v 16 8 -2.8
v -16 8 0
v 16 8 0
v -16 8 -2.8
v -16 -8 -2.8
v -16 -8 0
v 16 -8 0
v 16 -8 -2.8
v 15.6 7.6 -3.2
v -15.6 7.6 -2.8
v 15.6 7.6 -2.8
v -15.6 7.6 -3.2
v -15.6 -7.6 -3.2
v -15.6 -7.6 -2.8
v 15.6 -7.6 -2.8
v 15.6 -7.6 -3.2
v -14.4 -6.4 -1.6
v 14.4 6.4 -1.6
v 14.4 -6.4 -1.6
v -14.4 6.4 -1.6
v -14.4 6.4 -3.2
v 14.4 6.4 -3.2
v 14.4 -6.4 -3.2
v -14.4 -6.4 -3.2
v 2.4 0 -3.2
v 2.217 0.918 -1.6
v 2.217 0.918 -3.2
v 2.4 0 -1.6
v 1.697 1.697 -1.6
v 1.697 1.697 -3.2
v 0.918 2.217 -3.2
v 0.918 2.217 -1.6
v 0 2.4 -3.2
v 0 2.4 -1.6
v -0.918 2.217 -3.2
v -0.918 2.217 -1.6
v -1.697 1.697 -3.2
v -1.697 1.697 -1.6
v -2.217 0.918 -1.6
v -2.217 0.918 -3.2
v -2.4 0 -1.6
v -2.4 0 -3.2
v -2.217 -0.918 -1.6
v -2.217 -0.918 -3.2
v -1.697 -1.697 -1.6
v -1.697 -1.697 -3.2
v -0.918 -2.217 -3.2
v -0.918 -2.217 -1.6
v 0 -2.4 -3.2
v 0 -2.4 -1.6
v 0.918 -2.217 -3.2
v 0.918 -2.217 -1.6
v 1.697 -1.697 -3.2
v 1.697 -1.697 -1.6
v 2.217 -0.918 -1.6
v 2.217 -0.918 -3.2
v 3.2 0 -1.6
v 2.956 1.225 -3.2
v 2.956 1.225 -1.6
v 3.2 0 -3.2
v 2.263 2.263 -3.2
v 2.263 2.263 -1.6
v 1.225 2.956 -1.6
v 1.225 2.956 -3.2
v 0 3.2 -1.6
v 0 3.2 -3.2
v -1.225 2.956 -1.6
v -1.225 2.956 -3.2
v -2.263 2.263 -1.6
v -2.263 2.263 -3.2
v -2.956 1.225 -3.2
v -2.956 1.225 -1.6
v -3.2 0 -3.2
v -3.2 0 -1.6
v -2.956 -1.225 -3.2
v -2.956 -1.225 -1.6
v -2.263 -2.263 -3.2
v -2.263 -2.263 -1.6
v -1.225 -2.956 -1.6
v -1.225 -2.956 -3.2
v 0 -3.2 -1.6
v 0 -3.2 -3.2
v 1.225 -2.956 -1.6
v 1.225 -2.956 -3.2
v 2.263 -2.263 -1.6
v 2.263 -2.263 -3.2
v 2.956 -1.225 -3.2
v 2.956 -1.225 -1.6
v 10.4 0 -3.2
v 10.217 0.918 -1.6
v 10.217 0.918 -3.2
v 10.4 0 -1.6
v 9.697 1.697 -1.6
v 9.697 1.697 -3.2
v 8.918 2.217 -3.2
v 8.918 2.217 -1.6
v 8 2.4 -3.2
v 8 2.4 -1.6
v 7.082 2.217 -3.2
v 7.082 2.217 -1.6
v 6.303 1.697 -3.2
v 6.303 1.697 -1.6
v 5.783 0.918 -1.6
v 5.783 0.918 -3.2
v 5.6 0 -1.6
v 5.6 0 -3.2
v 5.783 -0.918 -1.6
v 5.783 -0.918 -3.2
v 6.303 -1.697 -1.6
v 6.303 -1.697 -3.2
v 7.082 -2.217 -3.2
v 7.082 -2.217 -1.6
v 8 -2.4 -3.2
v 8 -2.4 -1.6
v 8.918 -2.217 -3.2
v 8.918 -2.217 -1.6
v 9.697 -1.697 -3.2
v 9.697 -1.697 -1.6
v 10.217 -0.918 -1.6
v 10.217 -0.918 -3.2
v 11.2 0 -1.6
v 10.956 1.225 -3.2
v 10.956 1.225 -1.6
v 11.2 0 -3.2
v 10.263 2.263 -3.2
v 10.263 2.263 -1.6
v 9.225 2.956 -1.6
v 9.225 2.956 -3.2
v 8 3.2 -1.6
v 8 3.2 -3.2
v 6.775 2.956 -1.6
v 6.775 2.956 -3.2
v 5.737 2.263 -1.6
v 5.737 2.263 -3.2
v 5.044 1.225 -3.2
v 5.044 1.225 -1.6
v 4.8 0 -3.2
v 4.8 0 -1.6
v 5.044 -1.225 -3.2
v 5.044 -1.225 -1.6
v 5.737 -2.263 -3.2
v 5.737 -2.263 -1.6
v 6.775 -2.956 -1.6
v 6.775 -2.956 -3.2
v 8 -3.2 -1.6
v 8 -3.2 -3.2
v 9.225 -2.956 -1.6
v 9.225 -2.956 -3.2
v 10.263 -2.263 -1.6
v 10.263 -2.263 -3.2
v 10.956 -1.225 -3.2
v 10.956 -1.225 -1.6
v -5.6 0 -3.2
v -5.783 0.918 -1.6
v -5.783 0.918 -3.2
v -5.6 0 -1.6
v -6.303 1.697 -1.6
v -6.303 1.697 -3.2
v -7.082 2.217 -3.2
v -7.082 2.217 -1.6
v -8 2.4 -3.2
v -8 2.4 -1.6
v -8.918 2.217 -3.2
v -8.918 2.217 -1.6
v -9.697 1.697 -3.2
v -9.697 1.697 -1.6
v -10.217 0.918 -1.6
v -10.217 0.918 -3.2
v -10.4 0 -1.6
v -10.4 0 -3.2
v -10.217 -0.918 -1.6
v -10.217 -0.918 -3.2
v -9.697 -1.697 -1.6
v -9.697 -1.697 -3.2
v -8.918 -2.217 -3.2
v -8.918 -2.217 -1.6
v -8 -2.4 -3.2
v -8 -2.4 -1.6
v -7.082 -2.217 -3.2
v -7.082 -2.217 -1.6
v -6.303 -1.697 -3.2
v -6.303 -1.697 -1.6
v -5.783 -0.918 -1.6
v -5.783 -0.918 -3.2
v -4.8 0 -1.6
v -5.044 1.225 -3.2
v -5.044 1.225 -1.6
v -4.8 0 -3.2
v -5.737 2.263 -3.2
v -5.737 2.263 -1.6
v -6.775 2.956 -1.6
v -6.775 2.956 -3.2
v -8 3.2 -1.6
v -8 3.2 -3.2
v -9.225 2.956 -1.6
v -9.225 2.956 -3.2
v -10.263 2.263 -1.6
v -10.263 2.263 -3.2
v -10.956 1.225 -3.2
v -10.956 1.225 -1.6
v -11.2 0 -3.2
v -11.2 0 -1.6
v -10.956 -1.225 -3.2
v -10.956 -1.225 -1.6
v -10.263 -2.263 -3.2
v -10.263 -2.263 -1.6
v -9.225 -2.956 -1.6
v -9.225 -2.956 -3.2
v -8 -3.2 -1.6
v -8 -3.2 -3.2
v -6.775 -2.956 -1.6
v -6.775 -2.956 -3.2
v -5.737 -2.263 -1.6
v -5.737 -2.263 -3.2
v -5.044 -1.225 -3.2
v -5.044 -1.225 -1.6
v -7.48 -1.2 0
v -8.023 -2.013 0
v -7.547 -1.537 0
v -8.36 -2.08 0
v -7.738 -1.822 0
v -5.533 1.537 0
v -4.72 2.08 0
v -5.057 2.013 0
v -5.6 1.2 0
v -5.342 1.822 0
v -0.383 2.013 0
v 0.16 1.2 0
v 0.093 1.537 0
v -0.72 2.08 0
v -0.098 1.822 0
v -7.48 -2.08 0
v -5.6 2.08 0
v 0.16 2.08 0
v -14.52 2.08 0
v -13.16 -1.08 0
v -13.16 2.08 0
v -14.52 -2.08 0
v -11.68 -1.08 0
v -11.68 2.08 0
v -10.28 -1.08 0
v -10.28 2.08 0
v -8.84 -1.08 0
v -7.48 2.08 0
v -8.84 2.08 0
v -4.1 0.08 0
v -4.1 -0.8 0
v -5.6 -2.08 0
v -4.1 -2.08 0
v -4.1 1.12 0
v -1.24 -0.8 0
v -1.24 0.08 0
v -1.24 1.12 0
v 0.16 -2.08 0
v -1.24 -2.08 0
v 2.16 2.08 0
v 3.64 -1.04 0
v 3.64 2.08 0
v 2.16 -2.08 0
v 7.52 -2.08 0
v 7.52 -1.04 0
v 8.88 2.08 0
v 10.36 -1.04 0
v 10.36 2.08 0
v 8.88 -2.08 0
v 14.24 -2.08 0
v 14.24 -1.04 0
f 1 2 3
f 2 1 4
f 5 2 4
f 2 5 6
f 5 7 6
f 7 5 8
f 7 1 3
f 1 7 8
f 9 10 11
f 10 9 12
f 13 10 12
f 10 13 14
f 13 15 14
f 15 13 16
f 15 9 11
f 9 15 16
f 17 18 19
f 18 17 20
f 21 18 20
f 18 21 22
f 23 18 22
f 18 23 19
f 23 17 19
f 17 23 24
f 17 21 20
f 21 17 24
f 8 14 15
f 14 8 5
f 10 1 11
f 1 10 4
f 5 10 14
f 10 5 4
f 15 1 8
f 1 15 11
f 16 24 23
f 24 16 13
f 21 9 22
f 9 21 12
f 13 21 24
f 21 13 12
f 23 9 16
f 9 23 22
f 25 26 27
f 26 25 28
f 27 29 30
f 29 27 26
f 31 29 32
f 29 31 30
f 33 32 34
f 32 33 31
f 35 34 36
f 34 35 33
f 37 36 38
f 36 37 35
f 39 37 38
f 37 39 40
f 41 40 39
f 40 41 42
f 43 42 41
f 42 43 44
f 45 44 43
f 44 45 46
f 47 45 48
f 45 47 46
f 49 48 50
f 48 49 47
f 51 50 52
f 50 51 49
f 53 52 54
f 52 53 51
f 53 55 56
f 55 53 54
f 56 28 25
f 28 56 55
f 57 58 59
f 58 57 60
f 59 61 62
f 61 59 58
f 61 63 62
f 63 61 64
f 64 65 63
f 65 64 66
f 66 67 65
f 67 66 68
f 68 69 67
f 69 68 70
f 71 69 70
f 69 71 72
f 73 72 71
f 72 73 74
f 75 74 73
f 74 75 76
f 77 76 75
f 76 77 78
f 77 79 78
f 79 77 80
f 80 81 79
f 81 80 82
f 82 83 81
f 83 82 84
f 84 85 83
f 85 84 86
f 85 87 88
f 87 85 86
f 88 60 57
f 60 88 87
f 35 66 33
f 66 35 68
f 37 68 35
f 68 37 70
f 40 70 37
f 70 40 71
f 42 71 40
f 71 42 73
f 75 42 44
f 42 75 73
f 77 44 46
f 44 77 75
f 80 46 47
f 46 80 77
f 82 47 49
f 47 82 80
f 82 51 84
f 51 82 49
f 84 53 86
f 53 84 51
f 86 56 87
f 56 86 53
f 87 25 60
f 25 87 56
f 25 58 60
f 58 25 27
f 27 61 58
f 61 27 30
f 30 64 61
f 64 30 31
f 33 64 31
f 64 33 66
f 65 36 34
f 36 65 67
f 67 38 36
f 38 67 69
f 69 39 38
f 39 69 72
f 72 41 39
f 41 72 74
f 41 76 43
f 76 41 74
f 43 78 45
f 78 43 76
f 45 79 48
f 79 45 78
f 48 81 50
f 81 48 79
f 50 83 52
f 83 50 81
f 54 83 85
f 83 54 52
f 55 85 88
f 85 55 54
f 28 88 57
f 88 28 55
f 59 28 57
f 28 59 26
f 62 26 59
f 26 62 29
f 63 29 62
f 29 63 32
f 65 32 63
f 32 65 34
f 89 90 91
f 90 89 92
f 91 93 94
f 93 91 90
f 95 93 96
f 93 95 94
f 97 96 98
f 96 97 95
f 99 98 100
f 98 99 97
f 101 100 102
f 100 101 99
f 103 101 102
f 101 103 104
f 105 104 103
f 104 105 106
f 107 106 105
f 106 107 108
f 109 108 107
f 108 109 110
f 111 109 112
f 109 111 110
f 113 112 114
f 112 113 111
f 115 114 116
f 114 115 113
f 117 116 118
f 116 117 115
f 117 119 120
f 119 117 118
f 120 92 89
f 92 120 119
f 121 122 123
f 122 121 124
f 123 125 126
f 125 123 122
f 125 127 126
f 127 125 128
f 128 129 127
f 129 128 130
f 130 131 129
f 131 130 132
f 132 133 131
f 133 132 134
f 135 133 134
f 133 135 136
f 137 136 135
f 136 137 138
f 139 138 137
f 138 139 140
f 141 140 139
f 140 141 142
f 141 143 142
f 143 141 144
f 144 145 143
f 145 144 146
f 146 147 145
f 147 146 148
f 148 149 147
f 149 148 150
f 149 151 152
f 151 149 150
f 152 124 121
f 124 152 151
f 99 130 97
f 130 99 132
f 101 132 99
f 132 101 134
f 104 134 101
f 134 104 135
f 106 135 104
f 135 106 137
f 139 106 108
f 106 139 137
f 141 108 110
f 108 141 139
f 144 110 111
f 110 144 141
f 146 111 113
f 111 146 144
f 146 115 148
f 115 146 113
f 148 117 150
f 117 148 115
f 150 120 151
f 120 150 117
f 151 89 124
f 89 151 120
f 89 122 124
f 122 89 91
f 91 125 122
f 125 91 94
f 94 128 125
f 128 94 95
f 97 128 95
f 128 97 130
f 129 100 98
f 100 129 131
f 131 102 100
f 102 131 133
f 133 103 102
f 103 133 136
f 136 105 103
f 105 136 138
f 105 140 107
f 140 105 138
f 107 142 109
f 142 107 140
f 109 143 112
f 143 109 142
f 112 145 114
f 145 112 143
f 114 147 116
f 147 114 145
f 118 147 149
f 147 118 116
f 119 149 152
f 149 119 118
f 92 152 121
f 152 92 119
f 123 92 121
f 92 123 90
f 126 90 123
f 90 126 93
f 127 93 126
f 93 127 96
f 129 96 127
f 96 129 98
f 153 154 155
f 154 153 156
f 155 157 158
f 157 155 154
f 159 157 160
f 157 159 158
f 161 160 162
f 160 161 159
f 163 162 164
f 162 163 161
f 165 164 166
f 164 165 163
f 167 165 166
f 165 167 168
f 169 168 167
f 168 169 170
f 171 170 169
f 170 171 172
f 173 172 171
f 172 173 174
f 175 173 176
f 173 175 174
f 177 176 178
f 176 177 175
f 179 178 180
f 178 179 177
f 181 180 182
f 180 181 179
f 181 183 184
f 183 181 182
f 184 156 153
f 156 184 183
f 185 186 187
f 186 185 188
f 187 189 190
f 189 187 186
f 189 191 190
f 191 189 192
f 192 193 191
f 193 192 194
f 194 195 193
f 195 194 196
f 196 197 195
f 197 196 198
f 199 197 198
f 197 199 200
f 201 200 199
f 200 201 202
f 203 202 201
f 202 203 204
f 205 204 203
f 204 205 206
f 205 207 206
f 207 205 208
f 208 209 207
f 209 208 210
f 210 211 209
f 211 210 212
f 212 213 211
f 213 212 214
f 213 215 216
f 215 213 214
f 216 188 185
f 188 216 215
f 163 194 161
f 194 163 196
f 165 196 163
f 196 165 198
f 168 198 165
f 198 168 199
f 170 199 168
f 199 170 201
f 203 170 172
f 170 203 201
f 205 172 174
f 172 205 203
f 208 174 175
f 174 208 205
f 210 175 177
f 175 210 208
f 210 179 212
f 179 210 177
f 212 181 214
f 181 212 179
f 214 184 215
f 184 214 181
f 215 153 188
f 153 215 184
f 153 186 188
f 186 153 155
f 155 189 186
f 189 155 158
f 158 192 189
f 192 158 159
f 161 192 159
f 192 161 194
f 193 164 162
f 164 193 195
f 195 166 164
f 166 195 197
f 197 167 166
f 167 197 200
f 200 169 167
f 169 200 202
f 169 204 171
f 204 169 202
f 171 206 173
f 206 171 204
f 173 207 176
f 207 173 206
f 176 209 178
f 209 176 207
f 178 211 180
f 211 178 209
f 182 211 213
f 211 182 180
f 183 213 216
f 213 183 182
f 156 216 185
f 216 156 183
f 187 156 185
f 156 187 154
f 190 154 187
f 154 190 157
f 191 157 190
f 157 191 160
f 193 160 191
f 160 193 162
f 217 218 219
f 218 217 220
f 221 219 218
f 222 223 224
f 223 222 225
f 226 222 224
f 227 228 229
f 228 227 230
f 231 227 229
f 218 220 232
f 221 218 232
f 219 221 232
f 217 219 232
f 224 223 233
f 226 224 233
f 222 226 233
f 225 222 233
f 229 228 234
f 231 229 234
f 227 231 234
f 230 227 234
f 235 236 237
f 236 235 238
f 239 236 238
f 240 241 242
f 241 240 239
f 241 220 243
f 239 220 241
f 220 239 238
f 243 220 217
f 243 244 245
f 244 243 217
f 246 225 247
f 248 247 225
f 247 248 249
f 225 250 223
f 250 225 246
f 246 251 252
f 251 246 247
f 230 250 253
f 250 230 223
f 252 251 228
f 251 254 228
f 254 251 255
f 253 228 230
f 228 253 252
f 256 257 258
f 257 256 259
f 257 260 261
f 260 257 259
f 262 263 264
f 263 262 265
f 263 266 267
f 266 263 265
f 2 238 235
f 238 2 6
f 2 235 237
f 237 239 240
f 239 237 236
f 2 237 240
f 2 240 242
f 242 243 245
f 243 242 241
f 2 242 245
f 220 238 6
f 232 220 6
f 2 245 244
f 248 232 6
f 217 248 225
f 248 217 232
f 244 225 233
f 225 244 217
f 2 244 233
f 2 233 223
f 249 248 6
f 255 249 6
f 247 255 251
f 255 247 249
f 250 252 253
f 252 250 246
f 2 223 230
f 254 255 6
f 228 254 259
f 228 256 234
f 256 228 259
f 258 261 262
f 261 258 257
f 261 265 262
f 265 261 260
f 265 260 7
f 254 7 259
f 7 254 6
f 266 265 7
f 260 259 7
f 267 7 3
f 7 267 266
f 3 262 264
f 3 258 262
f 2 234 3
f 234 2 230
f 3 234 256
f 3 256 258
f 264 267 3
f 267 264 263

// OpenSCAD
// file: ../p/4-4ring3.scad
use <../lib.scad>
$fa=1; $fs=0.2;
function ldraw_lib__4_4ring3(realsolid=false) = [
// 0 Ring  3 x 1.0
// 0 Name: 4-4ring3.dat
// 0 Author: James Jessiman
// 0 !LDRAW_ORG Primitive UPDATE 2009-01
// 0 !LICENSE Licensed under CC BY 2.0 and CC BY 4.0 : see CAreadme.txt
// 
// 0 BFC CERTIFY CCW
  [0,"BFC","CERTIFY"],
  [0,"BFC","CCW"],
// 
// 0 !HISTORY 1998-12-15 [PTadmin] Official Update 1998-10
// 0 !HISTORY 2002-04-05 [hafhead] Added BFC statement
// 0 !HISTORY 2002-04-25 [PTadmin] Official Update 2002-02
// 0 !HISTORY 2007-06-24 [PTadmin] Header formatted for Contributor Agreement
// 0 !HISTORY 2008-07-01 [PTadmin] Official Update 2008-01
// 0 !HISTORY 2008-08-26 [cwdee] Switch polygon winding and rename
// 0 !HISTORY 2009-05-02 [PTadmin] Official Update 2009-01
// 
// 
// 4 16 -1.5308 0 3.6956 -1.1481 0 2.7717 0 0 3 0 0 4
  [4,16,-1.5308,0,3.6956,-1.1481,0,2.7717,0,0,3,0,0,4],
// 4 16 -2.8284 0 2.8284 -2.1213 0 2.1213 -1.1481 0 2.7717 -1.5308 0 3.6956
  [4,16,-2.8284,0,2.8284,-2.1213,0,2.1213,-1.1481,0,2.7717,-1.5308,0,3.6956],
// 4 16 -3.6956 0 1.5308 -2.7717 0 1.1481 -2.1213 0 2.1213 -2.8284 0 2.8284
  [4,16,-3.6956,0,1.5308,-2.7717,0,1.1481,-2.1213,0,2.1213,-2.8284,0,2.8284],
// 4 16 -4 0 0 -3 0 0 -2.7717 0 1.1481 -3.6956 0 1.5308
  [4,16,-4,0,0,-3,0,0,-2.7717,0,1.1481,-3.6956,0,1.5308],
// 4 16 -3.6956 0 -1.5308 -2.7717 0 -1.1481 -3 0 0 -4 0 0
  [4,16,-3.6956,0,-1.5308,-2.7717,0,-1.1481,-3,0,0,-4,0,0],
// 4 16 -2.8284 0 -2.8284 -2.1213 0 -2.1213 -2.7717 0 -1.1481 -3.6956 0 -1.5308
  [4,16,-2.8284,0,-2.8284,-2.1213,0,-2.1213,-2.7717,0,-1.1481,-3.6956,0,-1.5308],
// 4 16 -1.5308 0 -3.6956 -1.1481 0 -2.7717 -2.1213 0 -2.1213 -2.8284 0 -2.8284
  [4,16,-1.5308,0,-3.6956,-1.1481,0,-2.7717,-2.1213,0,-2.1213,-2.8284,0,-2.8284],
// 4 16 0 0 -4 0 0 -3 -1.1481 0 -2.7717 -1.5308 0 -3.6956
  [4,16,0,0,-4,0,0,-3,-1.1481,0,-2.7717,-1.5308,0,-3.6956],
// 4 16 1.5308 0 -3.6956 1.1481 0 -2.7717 0 0 -3 0 0 -4
  [4,16,1.5308,0,-3.6956,1.1481,0,-2.7717,0,0,-3,0,0,-4],
// 4 16 2.8284 0 -2.8284 2.1213 0 -2.1213 1.1481 0 -2.7717 1.5308 0 -3.6956
  [4,16,2.8284,0,-2.8284,2.1213,0,-2.1213,1.1481,0,-2.7717,1.5308,0,-3.6956],
// 4 16 3.6956 0 -1.5308 2.7717 0 -1.1481 2.1213 0 -2.1213 2.8284 0 -2.8284
  [4,16,3.6956,0,-1.5308,2.7717,0,-1.1481,2.1213,0,-2.1213,2.8284,0,-2.8284],
// 4 16 4 0 0 3 0 0 2.7717 0 -1.1481 3.6956 0 -1.5308
  [4,16,4,0,0,3,0,0,2.7717,0,-1.1481,3.6956,0,-1.5308],
// 4 16 3.6956 0 1.5308 2.7717 0 1.1481 3 0 0 4 0 0
  [4,16,3.6956,0,1.5308,2.7717,0,1.1481,3,0,0,4,0,0],
// 4 16 2.8284 0 2.8284 2.1213 0 2.1213 2.7717 0 1.1481 3.6956 0 1.5308
  [4,16,2.8284,0,2.8284,2.1213,0,2.1213,2.7717,0,1.1481,3.6956,0,1.5308],
// 4 16 1.5308 0 3.6956 1.1481 0 2.7717 2.1213 0 2.1213 2.8284 0 2.8284
  [4,16,1.5308,0,3.6956,1.1481,0,2.7717,2.1213,0,2.1213,2.8284,0,2.8284],
// 4 16 0 0 4 0 0 3 1.1481 0 2.7717 1.5308 0 3.6956
  [4,16,0,0,4,0,0,3,1.1481,0,2.7717,1.5308,0,3.6956],
// 0
];
module ldraw_lib__4_4ring3(step=0, col=false, unit=2/5, alt=false, line=0.2, solid=!$preview)
    makepoly(ldraw_lib__4_4ring3(solid), step=step, col=col, unit=unit, alt=alt, line=line, solid=solid);
ldraw_lib__4_4ring3(line=0.2);
// file: ../p/4-4edge.scad
use <../lib.scad>
function ldraw_lib__4_4edge() = [
// 0 Circle 1.0
// 0 Name: 4-4edge.dat
// 0 Author: James Jessiman
// 0 !LDRAW_ORG Primitive UPDATE 2017-01
// 0 !LICENSE Licensed under CC BY 2.0 and CC BY 4.0 : see CAreadme.txt
// 
// 0 BFC CERTIFY CCW
  [0,"BFC","CERTIFY"],
  [0,"BFC","CCW"],
// 
// 0 !HISTORY 1998-12-15 [PTadmin] Official Update 1998-10
// 0 !HISTORY 2005-12-28 [PTadmin] Official Update 2005-01
// 0 !HISTORY 2007-06-24 [PTadmin] Header formatted for Contributor Agreement
// 0 !HISTORY 2008-07-01 [PTadmin] Official Update 2008-01
// 0 !HISTORY 2017-01-15 [Steffen] BFCed
// 0 !HISTORY 2017-12-30 [PTadmin] Official Update 2017-01
// 
// 
// 2 24 1 0 0 0.9239 0 0.3827
  [2,24,1,0,0,0.9239,0,0.3827],
// 2 24 0.9239 0 0.3827 0.7071 0 0.7071
  [2,24,0.9239,0,0.3827,0.7071,0,0.7071],
// 2 24 0.7071 0 0.7071 0.3827 0 0.9239
  [2,24,0.7071,0,0.7071,0.3827,0,0.9239],
// 2 24 0.3827 0 0.9239 0 0 1
  [2,24,0.3827,0,0.9239,0,0,1],
// 2 24 0 0 1 -0.3827 0 0.9239
  [2,24,0,0,1,-0.3827,0,0.9239],
// 2 24 -0.3827 0 0.9239 -0.7071 0 0.7071
  [2,24,-0.3827,0,0.9239,-0.7071,0,0.7071],
// 2 24 -0.7071 0 0.7071 -0.9239 0 0.3827
  [2,24,-0.7071,0,0.7071,-0.9239,0,0.3827],
// 2 24 -0.9239 0 0.3827 -1 0 -0
  [2,24,-0.9239,0,0.3827,-1,0,-0],
// 2 24 -1 0 -0 -0.9239 0 -0.3827
  [2,24,-1,0,-0,-0.9239,0,-0.3827],
// 2 24 -0.9239 0 -0.3827 -0.7071 0 -0.7071
  [2,24,-0.9239,0,-0.3827,-0.7071,0,-0.7071],
// 2 24 -0.7071 0 -0.7071 -0.3827 0 -0.9239
  [2,24,-0.7071,0,-0.7071,-0.3827,0,-0.9239],
// 2 24 -0.3827 0 -0.9239 0 0 -1
  [2,24,-0.3827,0,-0.9239,0,0,-1],
// 2 24 0 0 -1 0.3827 0 -0.9239
  [2,24,0,0,-1,0.3827,0,-0.9239],
// 2 24 0.3827 0 -0.9239 0.7071 0 -0.7071
  [2,24,0.3827,0,-0.9239,0.7071,0,-0.7071],
// 2 24 0.7071 0 -0.7071 0.9239 0 -0.3827
  [2,24,0.7071,0,-0.7071,0.9239,0,-0.3827],
// 2 24 0.9239 0 -0.3827 1 0 0
  [2,24,0.9239,0,-0.3827,1,0,0],
];
module ldraw_lib__4_4edge(step=0, col=false, unit=2/5, alt=false, line=0.2, solid=!$preview)
    makepoly(ldraw_lib__4_4edge(), step=step, col=col, unit=unit, alt=alt, line=line, solid=solid);
ldraw_lib__4_4edge(line=0.2);
// file: ../p/4-4cyli.scad
use <../lib.scad>
$fa=1; $fs=0.2;
function ldraw_lib__4_4cyli(realsolid=false) = [
// 0 Cylinder 1.0
// 0 Name: 4-4cyli.dat
// 0 Author: James Jessiman
// 0 !LDRAW_ORG Primitive UPDATE 2005-01
// 0 !LICENSE Licensed under CC BY 2.0 and CC BY 4.0 : see CAreadme.txt
// 
// 0 BFC CERTIFY CCW
  [0,"BFC","CERTIFY"],
  [0,"BFC","CCW"],
// 
// 0 !HISTORY 1998-12-15 [PTadmin] Official Update 1998-10
// 0 !HISTORY 2002-03-23 [sbliss] Added BFC statement; merged headers from files in distributions LDraw 0.27 and Complete.
// 0 !HISTORY 2002-04-25 [PTadmin] Official Update 2002-02
// 0 !HISTORY 2004-12-14 [guyvivan] BFC CCW
// 0 !HISTORY 2005-12-28 [PTadmin] Official Update 2005-01
// 0 !HISTORY 2007-06-24 [PTadmin] Header formatted for Contributor Agreement
// 0 !HISTORY 2008-07-01 [PTadmin] Official Update 2008-01
// 
// 
// 4 16 1 1 0 0.9239 1 0.3827 0.9239 0 0.3827 1 0 0
  [4,16,1,1,0,0.9239,1,0.3827,0.9239,0,0.3827,1,0,0],
// 5 24 1 0 0 1 1 0 0.9239 0 0.3827 0.9239 0 -0.3827
  [5,24,1,0,0,1,1,0,0.9239,0,0.3827,0.9239,0,-0.3827],
// 4 16 0.9239 1 0.3827 0.7071 1 0.7071 0.7071 0 0.7071 0.9239 0 0.3827
  [4,16,0.9239,1,0.3827,0.7071,1,0.7071,0.7071,0,0.7071,0.9239,0,0.3827],
// 5 24 0.9239 0 0.3827 0.9239 1 0.3827 0.7071 0 0.7071 1 0 0
  [5,24,0.9239,0,0.3827,0.9239,1,0.3827,0.7071,0,0.7071,1,0,0],
// 4 16 0.7071 1 0.7071 0.3827 1 0.9239 0.3827 0 0.9239 0.7071 0 0.7071
  [4,16,0.7071,1,0.7071,0.3827,1,0.9239,0.3827,0,0.9239,0.7071,0,0.7071],
// 5 24 0.7071 0 0.7071 0.7071 1 0.7071 0.3827 0 0.9239 0.9239 0 0.3827
  [5,24,0.7071,0,0.7071,0.7071,1,0.7071,0.3827,0,0.9239,0.9239,0,0.3827],
// 4 16 0.3827 1 0.9239 0 1 1 0 0 1 0.3827 0 0.9239
  [4,16,0.3827,1,0.9239,0,1,1,0,0,1,0.3827,0,0.9239],
// 5 24 0.3827 0 0.9239 0.3827 1 0.9239 0 0 1 0.7071 0 0.7071
  [5,24,0.3827,0,0.9239,0.3827,1,0.9239,0,0,1,0.7071,0,0.7071],
// 4 16 0 1 1 -0.3827 1 0.9239 -0.3827 0 0.9239 0 0 1
  [4,16,0,1,1,-0.3827,1,0.9239,-0.3827,0,0.9239,0,0,1],
// 5 24 0 0 1 0 1 1 -0.3827 0 0.9239 0.3827 0 0.9239
  [5,24,0,0,1,0,1,1,-0.3827,0,0.9239,0.3827,0,0.9239],
// 4 16 -0.3827 1 0.9239 -0.7071 1 0.7071 -0.7071 0 0.7071 -0.3827 0 0.9239
  [4,16,-0.3827,1,0.9239,-0.7071,1,0.7071,-0.7071,0,0.7071,-0.3827,0,0.9239],
// 5 24 -0.3827 0 0.9239 -0.3827 1 0.9239 -0.7071 0 0.7071 0 0 1
  [5,24,-0.3827,0,0.9239,-0.3827,1,0.9239,-0.7071,0,0.7071,0,0,1],
// 4 16 -0.7071 1 0.7071 -0.9239 1 0.3827 -0.9239 0 0.3827 -0.7071 0 0.7071
  [4,16,-0.7071,1,0.7071,-0.9239,1,0.3827,-0.9239,0,0.3827,-0.7071,0,0.7071],
// 5 24 -0.7071 0 0.7071 -0.7071 1 0.7071 -0.9239 0 0.3827 -0.3827 0 0.9239
  [5,24,-0.7071,0,0.7071,-0.7071,1,0.7071,-0.9239,0,0.3827,-0.3827,0,0.9239],
// 4 16 -0.9239 1 0.3827 -1 1 0 -1 0 0 -0.9239 0 0.3827
  [4,16,-0.9239,1,0.3827,-1,1,0,-1,0,0,-0.9239,0,0.3827],
// 5 24 -0.9239 0 0.3827 -0.9239 1 0.3827 -1 0 0 -0.7071 0 0.7071
  [5,24,-0.9239,0,0.3827,-0.9239,1,0.3827,-1,0,0,-0.7071,0,0.7071],
// 4 16 -1 1 0 -0.9239 1 -0.3827 -0.9239 0 -0.3827 -1 0 0
  [4,16,-1,1,0,-0.9239,1,-0.3827,-0.9239,0,-0.3827,-1,0,0],
// 5 24 -1 0 0 -1 1 0 -0.9239 0 -0.3827 -0.9239 0 0.3827
  [5,24,-1,0,0,-1,1,0,-0.9239,0,-0.3827,-0.9239,0,0.3827],
// 4 16 -0.9239 1 -0.3827 -0.7071 1 -0.7071 -0.7071 0 -0.7071 -0.9239 0 -0.3827
  [4,16,-0.9239,1,-0.3827,-0.7071,1,-0.7071,-0.7071,0,-0.7071,-0.9239,0,-0.3827],
// 5 24 -0.9239 0 -0.3827 -0.9239 1 -0.3827 -0.7071 0 -0.7071 -1 0 0
  [5,24,-0.9239,0,-0.3827,-0.9239,1,-0.3827,-0.7071,0,-0.7071,-1,0,0],
// 4 16 -0.7071 1 -0.7071 -0.3827 1 -0.9239 -0.3827 0 -0.9239 -0.7071 0 -0.7071
  [4,16,-0.7071,1,-0.7071,-0.3827,1,-0.9239,-0.3827,0,-0.9239,-0.7071,0,-0.7071],
// 5 24 -0.7071 0 -0.7071 -0.7071 1 -0.7071 -0.3827 0 -0.9239 -0.9239 0 -0.3827
  [5,24,-0.7071,0,-0.7071,-0.7071,1,-0.7071,-0.3827,0,-0.9239,-0.9239,0,-0.3827],
// 4 16 -0.3827 1 -0.9239 0 1 -1 0 0 -1 -0.3827 0 -0.9239
  [4,16,-0.3827,1,-0.9239,0,1,-1,0,0,-1,-0.3827,0,-0.9239],
// 5 24 -0.3827 0 -0.9239 -0.3827 1 -0.9239 0 0 -1 -0.7071 0 -0.7071
  [5,24,-0.3827,0,-0.9239,-0.3827,1,-0.9239,0,0,-1,-0.7071,0,-0.7071],
// 4 16 0 1 -1 0.3827 1 -0.9239 0.3827 0 -0.9239 0 0 -1
  [4,16,0,1,-1,0.3827,1,-0.9239,0.3827,0,-0.9239,0,0,-1],
// 5 24 0 0 -1 0 1 -1 0.3827 0 -0.9239 -0.3827 0 -0.9239
  [5,24,0,0,-1,0,1,-1,0.3827,0,-0.9239,-0.3827,0,-0.9239],
// 4 16 0.3827 1 -0.9239 0.7071 1 -0.7071 0.7071 0 -0.7071 0.3827 0 -0.9239
  [4,16,0.3827,1,-0.9239,0.7071,1,-0.7071,0.7071,0,-0.7071,0.3827,0,-0.9239],
// 5 24 0.3827 0 -0.9239 0.3827 1 -0.9239 0.7071 0 -0.7071 0 0 -1
  [5,24,0.3827,0,-0.9239,0.3827,1,-0.9239,0.7071,0,-0.7071,0,0,-1],
// 4 16 0.7071 1 -0.7071 0.9239 1 -0.3827 0.9239 0 -0.3827 0.7071 0 -0.7071
  [4,16,0.7071,1,-0.7071,0.9239,1,-0.3827,0.9239,0,-0.3827,0.7071,0,-0.7071],
// 5 24 0.7071 0 -0.7071 0.7071 1 -0.7071 0.9239 0 -0.3827 0.3827 0 -0.9239
  [5,24,0.7071,0,-0.7071,0.7071,1,-0.7071,0.9239,0,-0.3827,0.3827,0,-0.9239],
// 4 16 0.9239 1 -0.3827 1 1 0 1 0 0 0.9239 0 -0.3827
  [4,16,0.9239,1,-0.3827,1,1,0,1,0,0,0.9239,0,-0.3827],
// 5 24 0.9239 0 -0.3827 0.9239 1 -0.3827 1 0 0 0.7071 0 -0.7071
  [5,24,0.9239,0,-0.3827,0.9239,1,-0.3827,1,0,0,0.7071,0,-0.7071],
// 0
];
module ldraw_lib__4_4cyli(step=0, col=false, unit=2/5, alt=false, line=0.2, solid=!$preview)
    makepoly(ldraw_lib__4_4cyli(solid), step=step, col=col, unit=unit, alt=alt, line=line, solid=solid);
ldraw_lib__4_4cyli(line=0.2);
// file: ../p/stud4.scad
use <../lib.scad>
use <4-4cyli.scad>
use <4-4edge.scad>
use <4-4ring3.scad>
function ldraw_lib__stud4() = [
// 0 Stud Tube Open
// 0 Name: stud4.dat
// 0 Author: James Jessiman
// 0 !LDRAW_ORG Primitive UPDATE 2009-02
// 0 !LICENSE Licensed under CC BY 4.0 : see CAreadme.txt
// 
// 0 BFC CERTIFY CCW
  [0,"BFC","CERTIFY"],
  [0,"BFC","CCW"],
// 
// 0 !HISTORY 1999-07-05 [PTadmin] Official Update 1999-05
// 0 !HISTORY 2002-04-04 [sbliss] Modified for BFC compliance
// 0 !HISTORY 2002-04-25 [PTadmin] Official Update 2002-02
// 0 !HISTORY 2007-06-24 [PTadmin] Header formatted for Contributor Agreement
// 0 !HISTORY 2008-07-01 [PTadmin] Official Update 2008-01
// 0 !HISTORY 2009-06-21 [cwdee] Update ring references to 4-4ring
// 0 !HISTORY 2009-09-03 [PTadmin] Official Update 2009-02
// 
// 
// 1 16 0 -4 0 6 0 0 0 1 0 0 0 6 4-4edge.dat
  [1,16,0,-4,0,6,0,0,0,1,0,0,0,6, ldraw_lib__4_4edge()],
// 1 16 0 -4 0 8 0 0 0 1 0 0 0 8 4-4edge.dat
  [1,16,0,-4,0,8,0,0,0,1,0,0,0,8, ldraw_lib__4_4edge()],
// 1 16 0 0 0 6 0 0 0 1 0 0 0 6 4-4edge.dat
  [1,16,0,0,0,6,0,0,0,1,0,0,0,6, ldraw_lib__4_4edge()],
// 1 16 0 0 0 8 0 0 0 1 0 0 0 8 4-4edge.dat
  [1,16,0,0,0,8,0,0,0,1,0,0,0,8, ldraw_lib__4_4edge()],
// 0 BFC INVERTNEXT
  [0,"BFC","INVERTNEXT"],
// 1 16 0 -4 0 6 0 0 0 4 0 0 0 6 4-4cyli.dat
  [1,16,0,-4,0,6,0,0,0,4,0,0,0,6, ldraw_lib__4_4cyli()],
// 1 16 0 -4 0 8 0 0 0 4 0 0 0 8 4-4cyli.dat
  [1,16,0,-4,0,8,0,0,0,4,0,0,0,8, ldraw_lib__4_4cyli()],
// 1 16 0 -4 0 2 0 0 0 1 0 0 0 2 4-4ring3.dat
  [1,16,0,-4,0,2,0,0,0,1,0,0,0,2, ldraw_lib__4_4ring3()],
  [-1,16,0,0,0,2,0,0,0,-1,0,0,0,2, ldraw_lib__4_4ring3()],
// 0
];
module ldraw_lib__stud4(step=0, col=false, unit=2/5, alt=false, line=0.2, solid=!$preview)
    makepoly(ldraw_lib__stud4(), step=step, col=col, unit=unit, alt=alt, line=line, solid=solid);
ldraw_lib__stud4(line=0.2);
// file: ../p/box5.scad
use <../lib.scad>
function ldraw_lib__box5() = [
// 0 Box with 5 Faces and All Edges
// 0 Name: box5.dat
// 0 Author: James Jessiman
// 0 !LDRAW_ORG Primitive UPDATE 2012-01
// 0 !LICENSE Licensed under CC BY 2.0 and CC BY 4.0 : see CAreadme.txt
// 
// 0 BFC CERTIFY CCW
  [0,"BFC","CERTIFY"],
  [0,"BFC","CCW"],
// 
// 0 !HISTORY 2002-04-03 [sbliss] Modified for BFC compliance
// 0 !HISTORY 2002-04-25 [PTadmin] Official Update 2002-02
// 0 !HISTORY 2007-06-24 [PTadmin] Header formatted for Contributor Agreement
// 0 !HISTORY 2008-07-01 [PTadmin] Official Update 2008-01
// 0 !HISTORY 2012-02-16 [Philo] Changed to CCW
// 0 !HISTORY 2012-03-30 [PTadmin] Official Update 2012-01
// 
// 
// 2 24 1 1 1 -1 1 1
  [2,24,1,1,1,-1,1,1],
// 2 24 -1 1 1 -1 1 -1
  [2,24,-1,1,1,-1,1,-1],
// 2 24 -1 1 -1 1 1 -1
  [2,24,-1,1,-1,1,1,-1],
// 2 24 1 1 -1 1 1 1
  [2,24,1,1,-1,1,1,1],
// 2 24 1 0 1 -1 0 1
  [2,24,1,0,1,-1,0,1],
// 2 24 -1 0 1 -1 0 -1
  [2,24,-1,0,1,-1,0,-1],
// 2 24 -1 0 -1 1 0 -1
  [2,24,-1,0,-1,1,0,-1],
// 2 24 1 0 -1 1 0 1
  [2,24,1,0,-1,1,0,1],
// 2 24 1 0 1 1 1 1
  [2,24,1,0,1,1,1,1],
// 2 24 -1 0 1 -1 1 1
  [2,24,-1,0,1,-1,1,1],
// 2 24 1 0 -1 1 1 -1
  [2,24,1,0,-1,1,1,-1],
// 2 24 -1 0 -1 -1 1 -1
  [2,24,-1,0,-1,-1,1,-1],
// 4 16 -1 1 1 1 1 1 1 1 -1 -1 1 -1
  [4,16,-1,1,1,1,1,1,1,1,-1,-1,1,-1],
// 4 16 -1 1 1 -1 0 1 1 0 1 1 1 1
  [4,16,-1,1,1,-1,0,1,1,0,1,1,1,1],
// 4 16 -1 1 -1 -1 0 -1 -1 0 1 -1 1 1
  [4,16,-1,1,-1,-1,0,-1,-1,0,1,-1,1,1],
// 4 16 1 1 -1 1 0 -1 -1 0 -1 -1 1 -1
  [4,16,1,1,-1,1,0,-1,-1,0,-1,-1,1,-1],
// 4 16 1 1 1 1 0 1 1 0 -1 1 1 -1
  [4,16,1,1,1,1,0,1,1,0,-1,1,1,-1],
];
makepoly(ldraw_lib__box5(), line=0.2);
// file: ../p/box4.scad
use <../lib.scad>
function ldraw_lib__box4() = [
// 0 Box with 4 Faces (2 Parallel Pairs) and All Edges
// 0 Name: box4.dat
// 0 Author: James Jessiman
// 0 !LDRAW_ORG Primitive UPDATE 2012-01
// 0 !LICENSE Licensed under CC BY 4.0 : see CAreadme.txt
// 
// 0 BFC CERTIFY CCW
  [0,"BFC","CERTIFY"],
  [0,"BFC","CCW"],
// 
// 0 !HISTORY 2002-04-03 [sbliss] Modified for BFC compliance
// 0 !HISTORY 2002-04-25 [PTadmin] Official Update 2002-02
// 0 !HISTORY 2007-06-24 [PTadmin] Header formatted for Contributor Agreement
// 0 !HISTORY 2008-07-01 [PTadmin] Official Update 2008-01
// 0 !HISTORY 2012-02-16 [Philo] Changed to CCW
// 0 !HISTORY 2012-03-30 [PTadmin] Official Update 2012-01
// 
// 
// 2 24 1 1 1 -1 1 1
  [2,24,1,1,1,-1,1,1],
// 2 24 -1 1 1 -1 1 -1
  [2,24,-1,1,1,-1,1,-1],
// 2 24 -1 1 -1 1 1 -1
  [2,24,-1,1,-1,1,1,-1],
// 2 24 1 1 -1 1 1 1
  [2,24,1,1,-1,1,1,1],
// 2 24 1 0 1 -1 0 1
  [2,24,1,0,1,-1,0,1],
// 2 24 -1 0 1 -1 0 -1
  [2,24,-1,0,1,-1,0,-1],
// 2 24 -1 0 -1 1 0 -1
  [2,24,-1,0,-1,1,0,-1],
// 2 24 1 0 -1 1 0 1
  [2,24,1,0,-1,1,0,1],
// 2 24 1 0 1 1 1 1
  [2,24,1,0,1,1,1,1],
// 2 24 -1 0 1 -1 1 1
  [2,24,-1,0,1,-1,1,1],
// 2 24 1 0 -1 1 1 -1
  [2,24,1,0,-1,1,1,-1],
// 2 24 -1 0 -1 -1 1 -1
  [2,24,-1,0,-1,-1,1,-1],
// 4 16 -1 1 1 -1 0 1 1 0 1 1 1 1
  [4,16,-1,1,1,-1,0,1,1,0,1,1,1,1],
// 4 16 -1 1 -1 -1 0 -1 -1 0 1 -1 1 1
  [4,16,-1,1,-1,-1,0,-1,-1,0,1,-1,1,1],
// 4 16 1 1 -1 1 0 -1 -1 0 -1 -1 1 -1
  [4,16,1,1,-1,1,0,-1,-1,0,-1,-1,1,-1],
// 4 16 1 1 1 1 0 1 1 0 -1 1 1 -1
  [4,16,1,1,1,1,0,1,1,0,-1,1,1,-1],
];
module ldraw_lib__box4(step=0, col=false, unit=2/5, alt=false, line=0.2, solid=!$preview)
    makepoly(ldraw_lib__box4(), step=step, col=col, unit=unit, alt=alt, line=line, solid=solid);
ldraw_lib__box4(line=0.2);
// file: s/87079s01.scad
use <../../lib.scad>
use <../../p/box4.scad>
use <../../p/box5.scad>
use <../../p/stud4.scad>
function ldraw_lib__s__87079s01() = [
// 0 ~Tile  2 x  4 without Top Surface
// 0 Name: s\87079s01.dat
// 0 Author: Philippe Hurbain [Philo]
// 0 !LDRAW_ORG Subpart UPDATE 2025-04
// 0 !LICENSE Licensed under CC BY 4.0 : see CAreadme.txt
// 
// 0 BFC CERTIFY CCW
  [0,"BFC","CERTIFY"],
  [0,"BFC","CCW"],
// 
// 0 !HISTORY 2012-09-30 [Philo] Subparted from Tim Gould's original design
// 0 !HISTORY 2012-12-28 [PTadmin] Official Update 2012-03
// 0 !HISTORY 2025-04-25 [MagFors] Update description
// 0 !HISTORY 2025-04-27 [OrionP] Official Update 2025-04
// 
// 1 16 0 0 0 40 0 0 0 7 0 0 0 20 box4.dat
  [1,16,0,0,0,40,0,0,0,7,0,0,0,20, ldraw_lib__box4()],
// 1 16 0 7 0 39 0 0 0 1 0 0 0 19 box4.dat
  [1,16,0,7,0,39,0,0,0,1,0,0,0,19, ldraw_lib__box4()],
// 0 BFC INVERTNEXT
  [0,"BFC","INVERTNEXT"],
// 1 16 0 8 0 -36 0 0 0 -4 0 0 0 16 box5.dat
  [1,16,0,8,0,-36,0,0,0,-4,0,0,0,16, ldraw_lib__box5()],
// 4 16 -40 7 -20 -39 7 -19 39 7 -19 40 7 -20
  [4,16,-40,7,-20,-39,7,-19,39,7,-19,40,7,-20],
// 4 16 40 7 20 39 7 19 -39 7 19 -40 7 20
  [4,16,40,7,20,39,7,19,-39,7,19,-40,7,20],
// 4 16 -40 7 -20 -40 7 20 -39 7 19 -39 7 -19
  [4,16,-40,7,-20,-40,7,20,-39,7,19,-39,7,-19],
// 4 16 40 7 20 40 7 -20 39 7 -19 39 7 19
  [4,16,40,7,20,40,7,-20,39,7,-19,39,7,19],
// 4 16 -39 8 -19 -36 8 -16 36 8 -16 39 8 -19
  [4,16,-39,8,-19,-36,8,-16,36,8,-16,39,8,-19],
// 4 16 39 8 19 36 8 16 -36 8 16 -39 8 19
  [4,16,39,8,19,36,8,16,-36,8,16,-39,8,19],
// 4 16 -39 8 -19 -39 8 19 -36 8 16 -36 8 -16
  [4,16,-39,8,-19,-39,8,19,-36,8,16,-36,8,-16],
// 4 16 39 8 19 39 8 -19 36 8 -16 36 8 16
  [4,16,39,8,19,39,8,-19,36,8,-16,36,8,16],
// 1 16 0 4 0 1 0 0 0 -1 0 0 0 1 stud4.dat
  [1,16,0,4,0,1,0,0,0,-1,0,0,0,1, ldraw_lib__stud4()],
// 1 16 20 4 0 1 0 0 0 -1 0 0 0 1 stud4.dat
  [1,16,20,4,0,1,0,0,0,-1,0,0,0,1, ldraw_lib__stud4()],
// 1 16 -20 4 0 1 0 0 0 -1 0 0 0 1 stud4.dat
  [1,16,-20,4,0,1,0,0,0,-1,0,0,0,1, ldraw_lib__stud4()],
];
module ldraw_lib__s__87079s01(step=0, col=false, unit=2/5, alt=false, line=0.2, solid=!$preview)
    makepoly(ldraw_lib__s__87079s01(), step=step, col=col, unit=unit, alt=alt, line=line, solid=solid);
ldraw_lib__s__87079s01(line=0.2);
// file: ../p/1-4ndis.scad
use <../lib.scad>
function ldraw_lib__1_4ndis() = [
// 0 Disc Negative 0.25
// 0 Name: 1-4ndis.dat
// 0 Author: James Jessiman
// 0 !LDRAW_ORG Primitive UPDATE 2012-01
// 0 !LICENSE Licensed under CC BY 2.0 and CC BY 4.0 : see CAreadme.txt
// 
// 0 BFC CERTIFY CCW
  [0,"BFC","CERTIFY"],
  [0,"BFC","CCW"],
// 
// 0 !HISTORY 2002-03-23 [sbliss] Added BFC Statement
// 0 !HISTORY 2002-04-25 [PTadmin] Official Update 2002-02
// 0 !HISTORY 2007-06-22 [PTadmin] Header formatted for Contributor Agreement
// 0 !HISTORY 2008-07-01 [PTadmin] Official Update 2008-01
// 0 !HISTORY 2012-02-16 [Philo] Changed to CCW
// 0 !HISTORY 2012-03-30 [PTadmin] Official Update 2012-01
// 
// 
// 3 16 0.9239 0 0.3827 1 0 0 1 0 1
  [3,16,0.9239,0,0.3827,1,0,0,1,0,1],
// 3 16 0.7071 0 0.7071 0.9239 0 0.3827 1 0 1
  [3,16,0.7071,0,0.7071,0.9239,0,0.3827,1,0,1],
// 3 16 0.3827 0 0.9239 0.7071 0 0.7071 1 0 1
  [3,16,0.3827,0,0.9239,0.7071,0,0.7071,1,0,1],
// 3 16 0 0 1 0.3827 0 0.9239 1 0 1
  [3,16,0,0,1,0.3827,0,0.9239,1,0,1],
];
module ldraw_lib__1_4ndis(step=0, col=false, unit=2/5, alt=false, line=0.2, solid=!$preview)
    makepoly(ldraw_lib__1_4ndis(), step=step, col=col, unit=unit, alt=alt, line=line, solid=solid);
ldraw_lib__1_4ndis(line=0.2);
// file: ../p/1-4chrd.scad
use <../lib.scad>
$fa=1; $fs=0.2;
function ldraw_lib__1_4chrd(realsolid=false) = [
// 0 Chord 0.25
// 0 Name: 1-4chrd.dat
// 0 Author: Tony Hafner [hafhead]
// 0 !LDRAW_ORG Primitive UPDATE 2012-02
// 0 !LICENSE Licensed under CC BY 2.0 and CC BY 4.0 : see CAreadme.txt
// 
// 0 BFC CERTIFY CCW
  [0,"BFC","CERTIFY"],
  [0,"BFC","CCW"],
// 
// 0 !HISTORY 2004-04-22 [PTadmin] Official Update 2004-02
// 0 !HISTORY 2007-10-09 [PTadmin] Header formatted for Contributor Agreement
// 0 !HISTORY 2008-07-01 [PTadmin] Official Update 2008-01
// 0 !HISTORY 2012-08-02 [MMR1988] Re-creation with PrimGen2 and Rectifier
// 0 !HISTORY 2012-08-09 [PTadmin] Official Update 2012-02
// 
// 
// 4 16 0.9239 0 0.3827 0.3827 0 0.9239 0 0 1 1 0 0
  [4,16,0.9239,0,0.3827,0.3827,0,0.9239,0,0,1,1,0,0],
// 3 16 0.7071 0 0.7071 0.3827 0 0.9239 0.9239 0 0.3827
  [3,16,0.7071,0,0.7071,0.3827,0,0.9239,0.9239,0,0.3827],
];
module ldraw_lib__1_4chrd(step=0, col=false, unit=2/5, alt=false, line=0.2, solid=!$preview)
    makepoly(ldraw_lib__1_4chrd(solid), step=step, col=col, unit=unit, alt=alt, line=line, solid=solid);
ldraw_lib__1_4chrd(line=0.2);
// main file
use <../lib.scad>
use <../p/1-4chrd.scad>
use <../p/1-4ndis.scad>
use <s/87079s01.scad>
function ldraw_lib__87079p08() = [
// 0 Tile  2 x  4 with Groove with Black "WALL" Pattern
// 0 Name: 87079p08.dat
// 0 Author: Christophe Mitillo [Christophe_Mitillo]
// 0 !LDRAW_ORG Part UPDATE 2017-01
// 0 !LICENSE Licensed under CC BY 2.0 and CC BY 4.0 : see CAreadme.txt
// 
// 0 BFC CERTIFY CCW
  [0,"BFC","CERTIFY"],
  [0,"BFC","CCW"],
// 
// 0 !KEYWORDS Bricklink 87079pb0239, Rebrickable 87079pr0083, Set 21303, Wall-E
// 
// 0 !HISTORY 2017-07-30 [Darats] Use primitives
// 0 !HISTORY 2017-12-30 [PTadmin] Official Update 2017-01
// 
// 
// 1 16 0 0 0 1 0 0 0 1 0 0 0 1 s\87079s01.dat
  [1,16,0,0,0,1,0,0,0,1,0,0,0,1, ldraw_lib__s__87079s01()],
// 1 0 -20.9 0 -3 0 0 2.2 0 1 0 -2.2 0 0 1-4chrd.dat
  [1,0,-20.9,0,-3,0,0,2.2,0,1,0,-2.2,0,0, ldraw_lib__1_4chrd()],
// 1 0 -11.8 0 3 0 0 -2.2 0 1 0 2.2 0 0 1-4chrd.dat
  [1,0,-11.8,0,3,0,0,-2.2,0,1,0,2.2,0,0, ldraw_lib__1_4chrd()],
// 1 0 -1.8 0 3 2.2 0 0 0 1 0 0 0 2.2 1-4chrd.dat
  [1,0,-1.8,0,3,2.2,0,0,0,1,0,0,0,2.2, ldraw_lib__1_4chrd()],
// 1 16 -20.9 0 -3 0 0 2.2 0 1 0 -2.2 0 0 1-4ndis.dat
  [1,16,-20.9,0,-3,0,0,2.2,0,1,0,-2.2,0,0, ldraw_lib__1_4ndis()],
// 1 16 -11.8 0 3 0 0 -2.2 0 1 0 2.2 0 0 1-4ndis.dat
  [1,16,-11.8,0,3,0,0,-2.2,0,1,0,2.2,0,0, ldraw_lib__1_4ndis()],
// 1 16 -1.8 0 3 2.2 0 0 0 1 0 0 0 2.2 1-4ndis.dat
  [1,16,-1.8,0,3,2.2,0,0,0,1,0,0,0,2.2, ldraw_lib__1_4ndis()],
// 4 0 -32.9 0 5.2 -36.3 0 5.2 -36.3 0 -5.2 -32.9 0 -2.7
  [4,0,-32.9,0,5.2,-36.3,0,5.2,-36.3,0,-5.2,-32.9,0,-2.7],
// 3 0 -29.2 0 -2.7 -32.9 0 -2.7 -36.3 0 -5.2
  [3,0,-29.2,0,-2.7,-32.9,0,-2.7,-36.3,0,-5.2],
// 4 0 -25.7 0 5.2 -29.2 0 5.2 -29.2 0 -2.7 -25.7 0 -2.7
  [4,0,-25.7,0,5.2,-29.2,0,5.2,-29.2,0,-2.7,-25.7,0,-2.7],
// 3 0 -25.7 0 -2.7 -20.9 0 -5.2 -22.1 0 -2.7
  [3,0,-25.7,0,-2.7,-20.9,0,-5.2,-22.1,0,-2.7],
// 4 0 -25.7 0 -2.7 -29.2 0 -2.7 -36.3 0 -5.2 -20.9 0 -5.2
  [4,0,-25.7,0,-2.7,-29.2,0,-2.7,-36.3,0,-5.2,-20.9,0,-5.2],
// 3 0 -22.1 0 -2.7 -20.9 0 -5.2 -18.7 0 -3
  [3,0,-22.1,0,-2.7,-20.9,0,-5.2,-18.7,0,-3],
// 4 0 -18.7 0 -3 -18.7 0 5.2 -22.1 0 5.2 -22.1 0 -2.7
  [4,0,-18.7,0,-3,-18.7,0,5.2,-22.1,0,5.2,-22.1,0,-2.7],
// 3 0 -10.25 0 0.2 -14 0 3 -10.25 0 -2
  [3,0,-10.25,0,0.2,-14,0,3,-10.25,0,-2],
// 4 0 -14 0 3 -14 0 -5.2 -10.25 0 -5.2 -10.25 0 -2
  [4,0,-14,0,3,-14,0,-5.2,-10.25,0,-5.2,-10.25,0,-2],
// 4 0 -14 0 3 -10.25 0 0.2 -10.25 0 2.8 -11.8 0 5.2
  [4,0,-14,0,3,-10.25,0,0.2,-10.25,0,2.8,-11.8,0,5.2],
// 4 0 -3.1 0 0.2 -10.25 0 0.2 -10.25 0 -2 -3.1 0 -2
  [4,0,-3.1,0,0.2,-10.25,0,0.2,-10.25,0,-2,-3.1,0,-2],
// 4 0 -1.8 0 5.2 -11.8 0 5.2 -10.25 0 2.8 -3.1 0 2.8
  [4,0,-1.8,0,5.2,-11.8,0,5.2,-10.25,0,2.8,-3.1,0,2.8],
// 3 0 -3.1 0 0.2 -3.1 0 -2 0.4 0 3
  [3,0,-3.1,0,0.2,-3.1,0,-2,0.4,0,3],
// 4 0 0.4 0 3 -3.1 0 -2 -3.1 0 -5.2 0.4 0 -5.2
  [4,0,0.4,0,3,-3.1,0,-2,-3.1,0,-5.2,0.4,0,-5.2],
// 4 0 -3.1 0 0.2 0.4 0 3 -1.8 0 5.2 -3.1 0 2.8
  [4,0,-3.1,0,0.2,0.4,0,3,-1.8,0,5.2,-3.1,0,2.8],
// 4 0 9.1 0 5.2 5.4 0 5.2 5.4 0 -5.2 9.1 0 -2.6
  [4,0,9.1,0,5.2,5.4,0,5.2,5.4,0,-5.2,9.1,0,-2.6],
// 4 0 9.1 0 -2.6 5.4 0 -5.2 18.8 0 -5.2 18.8 0 -2.6
  [4,0,9.1,0,-2.6,5.4,0,-5.2,18.8,0,-5.2,18.8,0,-2.6],
// 4 0 25.9 0 5.2 22.2 0 5.2 22.2 0 -5.2 25.9 0 -2.6
  [4,0,25.9,0,5.2,22.2,0,5.2,22.2,0,-5.2,25.9,0,-2.6],
// 4 0 25.9 0 -2.6 22.2 0 -5.2 35.6 0 -5.2 35.6 0 -2.6
  [4,0,25.9,0,-2.6,22.2,0,-5.2,35.6,0,-5.2,35.6,0,-2.6],
// 4 16 -40 0 -20 -36.3 0 -5.2 -36.3 0 5.2 -40 0 20
  [4,16,-40,0,-20,-36.3,0,-5.2,-36.3,0,5.2,-40,0,20],
// 3 16 -40 0 20 -36.3 0 5.2 -32.9 0 5.2
  [3,16,-40,0,20,-36.3,0,5.2,-32.9,0,5.2],
// 4 16 -29.2 0 5.2 -32.9 0 5.2 -32.9 0 -2.7 -29.2 0 -2.7
  [4,16,-29.2,0,5.2,-32.9,0,5.2,-32.9,0,-2.7,-29.2,0,-2.7],
// 3 16 -40 0 20 -32.9 0 5.2 -29.2 0 5.2
  [3,16,-40,0,20,-32.9,0,5.2,-29.2,0,5.2],
// 3 16 -40 0 20 -29.2 0 5.2 -25.7 0 5.2
  [3,16,-40,0,20,-29.2,0,5.2,-25.7,0,5.2],
// 4 16 -22.1 0 5.2 -25.7 0 5.2 -25.7 0 -2.7 -22.1 0 -2.7
  [4,16,-22.1,0,5.2,-25.7,0,5.2,-25.7,0,-2.7,-22.1,0,-2.7],
// 3 16 -40 0 20 -25.7 0 5.2 -22.1 0 5.2
  [3,16,-40,0,20,-25.7,0,5.2,-22.1,0,5.2],
// 3 16 -20.9 0 -5.2 -36.3 0 -5.2 -40 0 -20
  [3,16,-20.9,0,-5.2,-36.3,0,-5.2,-40,0,-20],
// 3 16 -18.7 0 -5.2 -20.9 0 -5.2 -40 0 -20
  [3,16,-18.7,0,-5.2,-20.9,0,-5.2,-40,0,-20],
// 3 16 -40 0 20 -22.1 0 5.2 -18.7 0 5.2
  [3,16,-40,0,20,-22.1,0,5.2,-18.7,0,5.2],
// 3 16 -14 0 -5.2 -18.7 0 -5.2 -40 0 -20
  [3,16,-14,0,-5.2,-18.7,0,-5.2,-40,0,-20],
// 4 16 -18.7 0 -3 -18.7 0 -5.2 -14 0 -5.2 -14 0 3
  [4,16,-18.7,0,-3,-18.7,0,-5.2,-14,0,-5.2,-14,0,3],
// 4 16 -14 0 3 -14 0 5.2 -18.7 0 5.2 -18.7 0 -3
  [4,16,-14,0,3,-14,0,5.2,-18.7,0,5.2,-18.7,0,-3],
// 3 16 -40 0 20 -18.7 0 5.2 -14 0 5.2
  [3,16,-40,0,20,-18.7,0,5.2,-14,0,5.2],
// 3 16 -40 0 20 -14 0 5.2 -11.8 0 5.2
  [3,16,-40,0,20,-14,0,5.2,-11.8,0,5.2],
// 3 16 -10.25 0 -5.2 -14 0 -5.2 -40 0 -20
  [3,16,-10.25,0,-5.2,-14,0,-5.2,-40,0,-20],
// 3 16 -3.1 0 -5.2 -10.25 0 -5.2 -40 0 -20
  [3,16,-3.1,0,-5.2,-10.25,0,-5.2,-40,0,-20],
// 4 16 -3.1 0 -2 -10.25 0 -2 -10.25 0 -5.2 -3.1 0 -5.2
  [4,16,-3.1,0,-2,-10.25,0,-2,-10.25,0,-5.2,-3.1,0,-5.2],
// 4 16 -3.1 0 2.8 -10.25 0 2.8 -10.25 0 0.2 -3.1 0 0.2
  [4,16,-3.1,0,2.8,-10.25,0,2.8,-10.25,0,0.2,-3.1,0,0.2],
// 3 16 -40 0 20 -11.8 0 5.2 -1.8 0 5.2
  [3,16,-40,0,20,-11.8,0,5.2,-1.8,0,5.2],
// 3 16 0.4 0 -5.2 -3.1 0 -5.2 -40 0 -20
  [3,16,0.4,0,-5.2,-3.1,0,-5.2,-40,0,-20],
// 3 16 0.4 0 3 0.4 0 -5.2 5.4 0 -5.2
  [3,16,0.4,0,3,0.4,0,-5.2,5.4,0,-5.2],
// 4 16 5.4 0 5.2 0.4 0 5.2 0.4 0 3 5.4 0 -5.2
  [4,16,5.4,0,5.2,0.4,0,5.2,0.4,0,3,5.4,0,-5.2],
// 4 16 9.1 0 5.2 9.1 0 -2.6 18.8 0 -2.6 22.2 0 5.2
  [4,16,9.1,0,5.2,9.1,0,-2.6,18.8,0,-2.6,22.2,0,5.2],
// 4 16 22.2 0 -5.2 22.2 0 5.2 18.8 0 -2.6 18.8 0 -5.2
  [4,16,22.2,0,-5.2,22.2,0,5.2,18.8,0,-2.6,18.8,0,-5.2],
// 3 16 22.2 0 -5.2 18.8 0 -5.2 40 0 -20
  [3,16,22.2,0,-5.2,18.8,0,-5.2,40,0,-20],
// 4 16 40 0 -20 5.4 0 -5.2 0.4 0 -5.2 -40 0 -20
  [4,16,40,0,-20,5.4,0,-5.2,0.4,0,-5.2,-40,0,-20],
// 3 16 35.6 0 -5.2 22.2 0 -5.2 40 0 -20
  [3,16,35.6,0,-5.2,22.2,0,-5.2,40,0,-20],
// 3 16 18.8 0 -5.2 5.4 0 -5.2 40 0 -20
  [3,16,18.8,0,-5.2,5.4,0,-5.2,40,0,-20],
// 4 16 40 0 -20 40 0 20 35.6 0 -2.6 35.6 0 -5.2
  [4,16,40,0,-20,40,0,20,35.6,0,-2.6,35.6,0,-5.2],
// 3 16 40 0 20 22.2 0 5.2 25.9 0 5.2
  [3,16,40,0,20,22.2,0,5.2,25.9,0,5.2],
// 3 16 40 0 20 9.1 0 5.2 22.2 0 5.2
  [3,16,40,0,20,9.1,0,5.2,22.2,0,5.2],
// 4 16 -40 0 20 -1.8 0 5.2 0.4 0 5.2 40 0 20
  [4,16,-40,0,20,-1.8,0,5.2,0.4,0,5.2,40,0,20],
// 3 16 40 0 20 0.4 0 5.2 5.4 0 5.2
  [3,16,40,0,20,0.4,0,5.2,5.4,0,5.2],
// 3 16 40 0 20 5.4 0 5.2 9.1 0 5.2
  [3,16,40,0,20,5.4,0,5.2,9.1,0,5.2],
// 4 16 25.9 0 5.2 25.9 0 -2.6 35.6 0 -2.6 40 0 20
  [4,16,25.9,0,5.2,25.9,0,-2.6,35.6,0,-2.6,40,0,20],
];
module ldraw_lib__87079p08(step=0, col=false, unit=2/5, alt=false, line=0.2, solid=!$preview)
    makepoly(ldraw_lib__87079p08(), step=step, col=col, unit=unit, alt=alt, line=line, solid=solid);
ldraw_lib__87079p08(line=0.2);
